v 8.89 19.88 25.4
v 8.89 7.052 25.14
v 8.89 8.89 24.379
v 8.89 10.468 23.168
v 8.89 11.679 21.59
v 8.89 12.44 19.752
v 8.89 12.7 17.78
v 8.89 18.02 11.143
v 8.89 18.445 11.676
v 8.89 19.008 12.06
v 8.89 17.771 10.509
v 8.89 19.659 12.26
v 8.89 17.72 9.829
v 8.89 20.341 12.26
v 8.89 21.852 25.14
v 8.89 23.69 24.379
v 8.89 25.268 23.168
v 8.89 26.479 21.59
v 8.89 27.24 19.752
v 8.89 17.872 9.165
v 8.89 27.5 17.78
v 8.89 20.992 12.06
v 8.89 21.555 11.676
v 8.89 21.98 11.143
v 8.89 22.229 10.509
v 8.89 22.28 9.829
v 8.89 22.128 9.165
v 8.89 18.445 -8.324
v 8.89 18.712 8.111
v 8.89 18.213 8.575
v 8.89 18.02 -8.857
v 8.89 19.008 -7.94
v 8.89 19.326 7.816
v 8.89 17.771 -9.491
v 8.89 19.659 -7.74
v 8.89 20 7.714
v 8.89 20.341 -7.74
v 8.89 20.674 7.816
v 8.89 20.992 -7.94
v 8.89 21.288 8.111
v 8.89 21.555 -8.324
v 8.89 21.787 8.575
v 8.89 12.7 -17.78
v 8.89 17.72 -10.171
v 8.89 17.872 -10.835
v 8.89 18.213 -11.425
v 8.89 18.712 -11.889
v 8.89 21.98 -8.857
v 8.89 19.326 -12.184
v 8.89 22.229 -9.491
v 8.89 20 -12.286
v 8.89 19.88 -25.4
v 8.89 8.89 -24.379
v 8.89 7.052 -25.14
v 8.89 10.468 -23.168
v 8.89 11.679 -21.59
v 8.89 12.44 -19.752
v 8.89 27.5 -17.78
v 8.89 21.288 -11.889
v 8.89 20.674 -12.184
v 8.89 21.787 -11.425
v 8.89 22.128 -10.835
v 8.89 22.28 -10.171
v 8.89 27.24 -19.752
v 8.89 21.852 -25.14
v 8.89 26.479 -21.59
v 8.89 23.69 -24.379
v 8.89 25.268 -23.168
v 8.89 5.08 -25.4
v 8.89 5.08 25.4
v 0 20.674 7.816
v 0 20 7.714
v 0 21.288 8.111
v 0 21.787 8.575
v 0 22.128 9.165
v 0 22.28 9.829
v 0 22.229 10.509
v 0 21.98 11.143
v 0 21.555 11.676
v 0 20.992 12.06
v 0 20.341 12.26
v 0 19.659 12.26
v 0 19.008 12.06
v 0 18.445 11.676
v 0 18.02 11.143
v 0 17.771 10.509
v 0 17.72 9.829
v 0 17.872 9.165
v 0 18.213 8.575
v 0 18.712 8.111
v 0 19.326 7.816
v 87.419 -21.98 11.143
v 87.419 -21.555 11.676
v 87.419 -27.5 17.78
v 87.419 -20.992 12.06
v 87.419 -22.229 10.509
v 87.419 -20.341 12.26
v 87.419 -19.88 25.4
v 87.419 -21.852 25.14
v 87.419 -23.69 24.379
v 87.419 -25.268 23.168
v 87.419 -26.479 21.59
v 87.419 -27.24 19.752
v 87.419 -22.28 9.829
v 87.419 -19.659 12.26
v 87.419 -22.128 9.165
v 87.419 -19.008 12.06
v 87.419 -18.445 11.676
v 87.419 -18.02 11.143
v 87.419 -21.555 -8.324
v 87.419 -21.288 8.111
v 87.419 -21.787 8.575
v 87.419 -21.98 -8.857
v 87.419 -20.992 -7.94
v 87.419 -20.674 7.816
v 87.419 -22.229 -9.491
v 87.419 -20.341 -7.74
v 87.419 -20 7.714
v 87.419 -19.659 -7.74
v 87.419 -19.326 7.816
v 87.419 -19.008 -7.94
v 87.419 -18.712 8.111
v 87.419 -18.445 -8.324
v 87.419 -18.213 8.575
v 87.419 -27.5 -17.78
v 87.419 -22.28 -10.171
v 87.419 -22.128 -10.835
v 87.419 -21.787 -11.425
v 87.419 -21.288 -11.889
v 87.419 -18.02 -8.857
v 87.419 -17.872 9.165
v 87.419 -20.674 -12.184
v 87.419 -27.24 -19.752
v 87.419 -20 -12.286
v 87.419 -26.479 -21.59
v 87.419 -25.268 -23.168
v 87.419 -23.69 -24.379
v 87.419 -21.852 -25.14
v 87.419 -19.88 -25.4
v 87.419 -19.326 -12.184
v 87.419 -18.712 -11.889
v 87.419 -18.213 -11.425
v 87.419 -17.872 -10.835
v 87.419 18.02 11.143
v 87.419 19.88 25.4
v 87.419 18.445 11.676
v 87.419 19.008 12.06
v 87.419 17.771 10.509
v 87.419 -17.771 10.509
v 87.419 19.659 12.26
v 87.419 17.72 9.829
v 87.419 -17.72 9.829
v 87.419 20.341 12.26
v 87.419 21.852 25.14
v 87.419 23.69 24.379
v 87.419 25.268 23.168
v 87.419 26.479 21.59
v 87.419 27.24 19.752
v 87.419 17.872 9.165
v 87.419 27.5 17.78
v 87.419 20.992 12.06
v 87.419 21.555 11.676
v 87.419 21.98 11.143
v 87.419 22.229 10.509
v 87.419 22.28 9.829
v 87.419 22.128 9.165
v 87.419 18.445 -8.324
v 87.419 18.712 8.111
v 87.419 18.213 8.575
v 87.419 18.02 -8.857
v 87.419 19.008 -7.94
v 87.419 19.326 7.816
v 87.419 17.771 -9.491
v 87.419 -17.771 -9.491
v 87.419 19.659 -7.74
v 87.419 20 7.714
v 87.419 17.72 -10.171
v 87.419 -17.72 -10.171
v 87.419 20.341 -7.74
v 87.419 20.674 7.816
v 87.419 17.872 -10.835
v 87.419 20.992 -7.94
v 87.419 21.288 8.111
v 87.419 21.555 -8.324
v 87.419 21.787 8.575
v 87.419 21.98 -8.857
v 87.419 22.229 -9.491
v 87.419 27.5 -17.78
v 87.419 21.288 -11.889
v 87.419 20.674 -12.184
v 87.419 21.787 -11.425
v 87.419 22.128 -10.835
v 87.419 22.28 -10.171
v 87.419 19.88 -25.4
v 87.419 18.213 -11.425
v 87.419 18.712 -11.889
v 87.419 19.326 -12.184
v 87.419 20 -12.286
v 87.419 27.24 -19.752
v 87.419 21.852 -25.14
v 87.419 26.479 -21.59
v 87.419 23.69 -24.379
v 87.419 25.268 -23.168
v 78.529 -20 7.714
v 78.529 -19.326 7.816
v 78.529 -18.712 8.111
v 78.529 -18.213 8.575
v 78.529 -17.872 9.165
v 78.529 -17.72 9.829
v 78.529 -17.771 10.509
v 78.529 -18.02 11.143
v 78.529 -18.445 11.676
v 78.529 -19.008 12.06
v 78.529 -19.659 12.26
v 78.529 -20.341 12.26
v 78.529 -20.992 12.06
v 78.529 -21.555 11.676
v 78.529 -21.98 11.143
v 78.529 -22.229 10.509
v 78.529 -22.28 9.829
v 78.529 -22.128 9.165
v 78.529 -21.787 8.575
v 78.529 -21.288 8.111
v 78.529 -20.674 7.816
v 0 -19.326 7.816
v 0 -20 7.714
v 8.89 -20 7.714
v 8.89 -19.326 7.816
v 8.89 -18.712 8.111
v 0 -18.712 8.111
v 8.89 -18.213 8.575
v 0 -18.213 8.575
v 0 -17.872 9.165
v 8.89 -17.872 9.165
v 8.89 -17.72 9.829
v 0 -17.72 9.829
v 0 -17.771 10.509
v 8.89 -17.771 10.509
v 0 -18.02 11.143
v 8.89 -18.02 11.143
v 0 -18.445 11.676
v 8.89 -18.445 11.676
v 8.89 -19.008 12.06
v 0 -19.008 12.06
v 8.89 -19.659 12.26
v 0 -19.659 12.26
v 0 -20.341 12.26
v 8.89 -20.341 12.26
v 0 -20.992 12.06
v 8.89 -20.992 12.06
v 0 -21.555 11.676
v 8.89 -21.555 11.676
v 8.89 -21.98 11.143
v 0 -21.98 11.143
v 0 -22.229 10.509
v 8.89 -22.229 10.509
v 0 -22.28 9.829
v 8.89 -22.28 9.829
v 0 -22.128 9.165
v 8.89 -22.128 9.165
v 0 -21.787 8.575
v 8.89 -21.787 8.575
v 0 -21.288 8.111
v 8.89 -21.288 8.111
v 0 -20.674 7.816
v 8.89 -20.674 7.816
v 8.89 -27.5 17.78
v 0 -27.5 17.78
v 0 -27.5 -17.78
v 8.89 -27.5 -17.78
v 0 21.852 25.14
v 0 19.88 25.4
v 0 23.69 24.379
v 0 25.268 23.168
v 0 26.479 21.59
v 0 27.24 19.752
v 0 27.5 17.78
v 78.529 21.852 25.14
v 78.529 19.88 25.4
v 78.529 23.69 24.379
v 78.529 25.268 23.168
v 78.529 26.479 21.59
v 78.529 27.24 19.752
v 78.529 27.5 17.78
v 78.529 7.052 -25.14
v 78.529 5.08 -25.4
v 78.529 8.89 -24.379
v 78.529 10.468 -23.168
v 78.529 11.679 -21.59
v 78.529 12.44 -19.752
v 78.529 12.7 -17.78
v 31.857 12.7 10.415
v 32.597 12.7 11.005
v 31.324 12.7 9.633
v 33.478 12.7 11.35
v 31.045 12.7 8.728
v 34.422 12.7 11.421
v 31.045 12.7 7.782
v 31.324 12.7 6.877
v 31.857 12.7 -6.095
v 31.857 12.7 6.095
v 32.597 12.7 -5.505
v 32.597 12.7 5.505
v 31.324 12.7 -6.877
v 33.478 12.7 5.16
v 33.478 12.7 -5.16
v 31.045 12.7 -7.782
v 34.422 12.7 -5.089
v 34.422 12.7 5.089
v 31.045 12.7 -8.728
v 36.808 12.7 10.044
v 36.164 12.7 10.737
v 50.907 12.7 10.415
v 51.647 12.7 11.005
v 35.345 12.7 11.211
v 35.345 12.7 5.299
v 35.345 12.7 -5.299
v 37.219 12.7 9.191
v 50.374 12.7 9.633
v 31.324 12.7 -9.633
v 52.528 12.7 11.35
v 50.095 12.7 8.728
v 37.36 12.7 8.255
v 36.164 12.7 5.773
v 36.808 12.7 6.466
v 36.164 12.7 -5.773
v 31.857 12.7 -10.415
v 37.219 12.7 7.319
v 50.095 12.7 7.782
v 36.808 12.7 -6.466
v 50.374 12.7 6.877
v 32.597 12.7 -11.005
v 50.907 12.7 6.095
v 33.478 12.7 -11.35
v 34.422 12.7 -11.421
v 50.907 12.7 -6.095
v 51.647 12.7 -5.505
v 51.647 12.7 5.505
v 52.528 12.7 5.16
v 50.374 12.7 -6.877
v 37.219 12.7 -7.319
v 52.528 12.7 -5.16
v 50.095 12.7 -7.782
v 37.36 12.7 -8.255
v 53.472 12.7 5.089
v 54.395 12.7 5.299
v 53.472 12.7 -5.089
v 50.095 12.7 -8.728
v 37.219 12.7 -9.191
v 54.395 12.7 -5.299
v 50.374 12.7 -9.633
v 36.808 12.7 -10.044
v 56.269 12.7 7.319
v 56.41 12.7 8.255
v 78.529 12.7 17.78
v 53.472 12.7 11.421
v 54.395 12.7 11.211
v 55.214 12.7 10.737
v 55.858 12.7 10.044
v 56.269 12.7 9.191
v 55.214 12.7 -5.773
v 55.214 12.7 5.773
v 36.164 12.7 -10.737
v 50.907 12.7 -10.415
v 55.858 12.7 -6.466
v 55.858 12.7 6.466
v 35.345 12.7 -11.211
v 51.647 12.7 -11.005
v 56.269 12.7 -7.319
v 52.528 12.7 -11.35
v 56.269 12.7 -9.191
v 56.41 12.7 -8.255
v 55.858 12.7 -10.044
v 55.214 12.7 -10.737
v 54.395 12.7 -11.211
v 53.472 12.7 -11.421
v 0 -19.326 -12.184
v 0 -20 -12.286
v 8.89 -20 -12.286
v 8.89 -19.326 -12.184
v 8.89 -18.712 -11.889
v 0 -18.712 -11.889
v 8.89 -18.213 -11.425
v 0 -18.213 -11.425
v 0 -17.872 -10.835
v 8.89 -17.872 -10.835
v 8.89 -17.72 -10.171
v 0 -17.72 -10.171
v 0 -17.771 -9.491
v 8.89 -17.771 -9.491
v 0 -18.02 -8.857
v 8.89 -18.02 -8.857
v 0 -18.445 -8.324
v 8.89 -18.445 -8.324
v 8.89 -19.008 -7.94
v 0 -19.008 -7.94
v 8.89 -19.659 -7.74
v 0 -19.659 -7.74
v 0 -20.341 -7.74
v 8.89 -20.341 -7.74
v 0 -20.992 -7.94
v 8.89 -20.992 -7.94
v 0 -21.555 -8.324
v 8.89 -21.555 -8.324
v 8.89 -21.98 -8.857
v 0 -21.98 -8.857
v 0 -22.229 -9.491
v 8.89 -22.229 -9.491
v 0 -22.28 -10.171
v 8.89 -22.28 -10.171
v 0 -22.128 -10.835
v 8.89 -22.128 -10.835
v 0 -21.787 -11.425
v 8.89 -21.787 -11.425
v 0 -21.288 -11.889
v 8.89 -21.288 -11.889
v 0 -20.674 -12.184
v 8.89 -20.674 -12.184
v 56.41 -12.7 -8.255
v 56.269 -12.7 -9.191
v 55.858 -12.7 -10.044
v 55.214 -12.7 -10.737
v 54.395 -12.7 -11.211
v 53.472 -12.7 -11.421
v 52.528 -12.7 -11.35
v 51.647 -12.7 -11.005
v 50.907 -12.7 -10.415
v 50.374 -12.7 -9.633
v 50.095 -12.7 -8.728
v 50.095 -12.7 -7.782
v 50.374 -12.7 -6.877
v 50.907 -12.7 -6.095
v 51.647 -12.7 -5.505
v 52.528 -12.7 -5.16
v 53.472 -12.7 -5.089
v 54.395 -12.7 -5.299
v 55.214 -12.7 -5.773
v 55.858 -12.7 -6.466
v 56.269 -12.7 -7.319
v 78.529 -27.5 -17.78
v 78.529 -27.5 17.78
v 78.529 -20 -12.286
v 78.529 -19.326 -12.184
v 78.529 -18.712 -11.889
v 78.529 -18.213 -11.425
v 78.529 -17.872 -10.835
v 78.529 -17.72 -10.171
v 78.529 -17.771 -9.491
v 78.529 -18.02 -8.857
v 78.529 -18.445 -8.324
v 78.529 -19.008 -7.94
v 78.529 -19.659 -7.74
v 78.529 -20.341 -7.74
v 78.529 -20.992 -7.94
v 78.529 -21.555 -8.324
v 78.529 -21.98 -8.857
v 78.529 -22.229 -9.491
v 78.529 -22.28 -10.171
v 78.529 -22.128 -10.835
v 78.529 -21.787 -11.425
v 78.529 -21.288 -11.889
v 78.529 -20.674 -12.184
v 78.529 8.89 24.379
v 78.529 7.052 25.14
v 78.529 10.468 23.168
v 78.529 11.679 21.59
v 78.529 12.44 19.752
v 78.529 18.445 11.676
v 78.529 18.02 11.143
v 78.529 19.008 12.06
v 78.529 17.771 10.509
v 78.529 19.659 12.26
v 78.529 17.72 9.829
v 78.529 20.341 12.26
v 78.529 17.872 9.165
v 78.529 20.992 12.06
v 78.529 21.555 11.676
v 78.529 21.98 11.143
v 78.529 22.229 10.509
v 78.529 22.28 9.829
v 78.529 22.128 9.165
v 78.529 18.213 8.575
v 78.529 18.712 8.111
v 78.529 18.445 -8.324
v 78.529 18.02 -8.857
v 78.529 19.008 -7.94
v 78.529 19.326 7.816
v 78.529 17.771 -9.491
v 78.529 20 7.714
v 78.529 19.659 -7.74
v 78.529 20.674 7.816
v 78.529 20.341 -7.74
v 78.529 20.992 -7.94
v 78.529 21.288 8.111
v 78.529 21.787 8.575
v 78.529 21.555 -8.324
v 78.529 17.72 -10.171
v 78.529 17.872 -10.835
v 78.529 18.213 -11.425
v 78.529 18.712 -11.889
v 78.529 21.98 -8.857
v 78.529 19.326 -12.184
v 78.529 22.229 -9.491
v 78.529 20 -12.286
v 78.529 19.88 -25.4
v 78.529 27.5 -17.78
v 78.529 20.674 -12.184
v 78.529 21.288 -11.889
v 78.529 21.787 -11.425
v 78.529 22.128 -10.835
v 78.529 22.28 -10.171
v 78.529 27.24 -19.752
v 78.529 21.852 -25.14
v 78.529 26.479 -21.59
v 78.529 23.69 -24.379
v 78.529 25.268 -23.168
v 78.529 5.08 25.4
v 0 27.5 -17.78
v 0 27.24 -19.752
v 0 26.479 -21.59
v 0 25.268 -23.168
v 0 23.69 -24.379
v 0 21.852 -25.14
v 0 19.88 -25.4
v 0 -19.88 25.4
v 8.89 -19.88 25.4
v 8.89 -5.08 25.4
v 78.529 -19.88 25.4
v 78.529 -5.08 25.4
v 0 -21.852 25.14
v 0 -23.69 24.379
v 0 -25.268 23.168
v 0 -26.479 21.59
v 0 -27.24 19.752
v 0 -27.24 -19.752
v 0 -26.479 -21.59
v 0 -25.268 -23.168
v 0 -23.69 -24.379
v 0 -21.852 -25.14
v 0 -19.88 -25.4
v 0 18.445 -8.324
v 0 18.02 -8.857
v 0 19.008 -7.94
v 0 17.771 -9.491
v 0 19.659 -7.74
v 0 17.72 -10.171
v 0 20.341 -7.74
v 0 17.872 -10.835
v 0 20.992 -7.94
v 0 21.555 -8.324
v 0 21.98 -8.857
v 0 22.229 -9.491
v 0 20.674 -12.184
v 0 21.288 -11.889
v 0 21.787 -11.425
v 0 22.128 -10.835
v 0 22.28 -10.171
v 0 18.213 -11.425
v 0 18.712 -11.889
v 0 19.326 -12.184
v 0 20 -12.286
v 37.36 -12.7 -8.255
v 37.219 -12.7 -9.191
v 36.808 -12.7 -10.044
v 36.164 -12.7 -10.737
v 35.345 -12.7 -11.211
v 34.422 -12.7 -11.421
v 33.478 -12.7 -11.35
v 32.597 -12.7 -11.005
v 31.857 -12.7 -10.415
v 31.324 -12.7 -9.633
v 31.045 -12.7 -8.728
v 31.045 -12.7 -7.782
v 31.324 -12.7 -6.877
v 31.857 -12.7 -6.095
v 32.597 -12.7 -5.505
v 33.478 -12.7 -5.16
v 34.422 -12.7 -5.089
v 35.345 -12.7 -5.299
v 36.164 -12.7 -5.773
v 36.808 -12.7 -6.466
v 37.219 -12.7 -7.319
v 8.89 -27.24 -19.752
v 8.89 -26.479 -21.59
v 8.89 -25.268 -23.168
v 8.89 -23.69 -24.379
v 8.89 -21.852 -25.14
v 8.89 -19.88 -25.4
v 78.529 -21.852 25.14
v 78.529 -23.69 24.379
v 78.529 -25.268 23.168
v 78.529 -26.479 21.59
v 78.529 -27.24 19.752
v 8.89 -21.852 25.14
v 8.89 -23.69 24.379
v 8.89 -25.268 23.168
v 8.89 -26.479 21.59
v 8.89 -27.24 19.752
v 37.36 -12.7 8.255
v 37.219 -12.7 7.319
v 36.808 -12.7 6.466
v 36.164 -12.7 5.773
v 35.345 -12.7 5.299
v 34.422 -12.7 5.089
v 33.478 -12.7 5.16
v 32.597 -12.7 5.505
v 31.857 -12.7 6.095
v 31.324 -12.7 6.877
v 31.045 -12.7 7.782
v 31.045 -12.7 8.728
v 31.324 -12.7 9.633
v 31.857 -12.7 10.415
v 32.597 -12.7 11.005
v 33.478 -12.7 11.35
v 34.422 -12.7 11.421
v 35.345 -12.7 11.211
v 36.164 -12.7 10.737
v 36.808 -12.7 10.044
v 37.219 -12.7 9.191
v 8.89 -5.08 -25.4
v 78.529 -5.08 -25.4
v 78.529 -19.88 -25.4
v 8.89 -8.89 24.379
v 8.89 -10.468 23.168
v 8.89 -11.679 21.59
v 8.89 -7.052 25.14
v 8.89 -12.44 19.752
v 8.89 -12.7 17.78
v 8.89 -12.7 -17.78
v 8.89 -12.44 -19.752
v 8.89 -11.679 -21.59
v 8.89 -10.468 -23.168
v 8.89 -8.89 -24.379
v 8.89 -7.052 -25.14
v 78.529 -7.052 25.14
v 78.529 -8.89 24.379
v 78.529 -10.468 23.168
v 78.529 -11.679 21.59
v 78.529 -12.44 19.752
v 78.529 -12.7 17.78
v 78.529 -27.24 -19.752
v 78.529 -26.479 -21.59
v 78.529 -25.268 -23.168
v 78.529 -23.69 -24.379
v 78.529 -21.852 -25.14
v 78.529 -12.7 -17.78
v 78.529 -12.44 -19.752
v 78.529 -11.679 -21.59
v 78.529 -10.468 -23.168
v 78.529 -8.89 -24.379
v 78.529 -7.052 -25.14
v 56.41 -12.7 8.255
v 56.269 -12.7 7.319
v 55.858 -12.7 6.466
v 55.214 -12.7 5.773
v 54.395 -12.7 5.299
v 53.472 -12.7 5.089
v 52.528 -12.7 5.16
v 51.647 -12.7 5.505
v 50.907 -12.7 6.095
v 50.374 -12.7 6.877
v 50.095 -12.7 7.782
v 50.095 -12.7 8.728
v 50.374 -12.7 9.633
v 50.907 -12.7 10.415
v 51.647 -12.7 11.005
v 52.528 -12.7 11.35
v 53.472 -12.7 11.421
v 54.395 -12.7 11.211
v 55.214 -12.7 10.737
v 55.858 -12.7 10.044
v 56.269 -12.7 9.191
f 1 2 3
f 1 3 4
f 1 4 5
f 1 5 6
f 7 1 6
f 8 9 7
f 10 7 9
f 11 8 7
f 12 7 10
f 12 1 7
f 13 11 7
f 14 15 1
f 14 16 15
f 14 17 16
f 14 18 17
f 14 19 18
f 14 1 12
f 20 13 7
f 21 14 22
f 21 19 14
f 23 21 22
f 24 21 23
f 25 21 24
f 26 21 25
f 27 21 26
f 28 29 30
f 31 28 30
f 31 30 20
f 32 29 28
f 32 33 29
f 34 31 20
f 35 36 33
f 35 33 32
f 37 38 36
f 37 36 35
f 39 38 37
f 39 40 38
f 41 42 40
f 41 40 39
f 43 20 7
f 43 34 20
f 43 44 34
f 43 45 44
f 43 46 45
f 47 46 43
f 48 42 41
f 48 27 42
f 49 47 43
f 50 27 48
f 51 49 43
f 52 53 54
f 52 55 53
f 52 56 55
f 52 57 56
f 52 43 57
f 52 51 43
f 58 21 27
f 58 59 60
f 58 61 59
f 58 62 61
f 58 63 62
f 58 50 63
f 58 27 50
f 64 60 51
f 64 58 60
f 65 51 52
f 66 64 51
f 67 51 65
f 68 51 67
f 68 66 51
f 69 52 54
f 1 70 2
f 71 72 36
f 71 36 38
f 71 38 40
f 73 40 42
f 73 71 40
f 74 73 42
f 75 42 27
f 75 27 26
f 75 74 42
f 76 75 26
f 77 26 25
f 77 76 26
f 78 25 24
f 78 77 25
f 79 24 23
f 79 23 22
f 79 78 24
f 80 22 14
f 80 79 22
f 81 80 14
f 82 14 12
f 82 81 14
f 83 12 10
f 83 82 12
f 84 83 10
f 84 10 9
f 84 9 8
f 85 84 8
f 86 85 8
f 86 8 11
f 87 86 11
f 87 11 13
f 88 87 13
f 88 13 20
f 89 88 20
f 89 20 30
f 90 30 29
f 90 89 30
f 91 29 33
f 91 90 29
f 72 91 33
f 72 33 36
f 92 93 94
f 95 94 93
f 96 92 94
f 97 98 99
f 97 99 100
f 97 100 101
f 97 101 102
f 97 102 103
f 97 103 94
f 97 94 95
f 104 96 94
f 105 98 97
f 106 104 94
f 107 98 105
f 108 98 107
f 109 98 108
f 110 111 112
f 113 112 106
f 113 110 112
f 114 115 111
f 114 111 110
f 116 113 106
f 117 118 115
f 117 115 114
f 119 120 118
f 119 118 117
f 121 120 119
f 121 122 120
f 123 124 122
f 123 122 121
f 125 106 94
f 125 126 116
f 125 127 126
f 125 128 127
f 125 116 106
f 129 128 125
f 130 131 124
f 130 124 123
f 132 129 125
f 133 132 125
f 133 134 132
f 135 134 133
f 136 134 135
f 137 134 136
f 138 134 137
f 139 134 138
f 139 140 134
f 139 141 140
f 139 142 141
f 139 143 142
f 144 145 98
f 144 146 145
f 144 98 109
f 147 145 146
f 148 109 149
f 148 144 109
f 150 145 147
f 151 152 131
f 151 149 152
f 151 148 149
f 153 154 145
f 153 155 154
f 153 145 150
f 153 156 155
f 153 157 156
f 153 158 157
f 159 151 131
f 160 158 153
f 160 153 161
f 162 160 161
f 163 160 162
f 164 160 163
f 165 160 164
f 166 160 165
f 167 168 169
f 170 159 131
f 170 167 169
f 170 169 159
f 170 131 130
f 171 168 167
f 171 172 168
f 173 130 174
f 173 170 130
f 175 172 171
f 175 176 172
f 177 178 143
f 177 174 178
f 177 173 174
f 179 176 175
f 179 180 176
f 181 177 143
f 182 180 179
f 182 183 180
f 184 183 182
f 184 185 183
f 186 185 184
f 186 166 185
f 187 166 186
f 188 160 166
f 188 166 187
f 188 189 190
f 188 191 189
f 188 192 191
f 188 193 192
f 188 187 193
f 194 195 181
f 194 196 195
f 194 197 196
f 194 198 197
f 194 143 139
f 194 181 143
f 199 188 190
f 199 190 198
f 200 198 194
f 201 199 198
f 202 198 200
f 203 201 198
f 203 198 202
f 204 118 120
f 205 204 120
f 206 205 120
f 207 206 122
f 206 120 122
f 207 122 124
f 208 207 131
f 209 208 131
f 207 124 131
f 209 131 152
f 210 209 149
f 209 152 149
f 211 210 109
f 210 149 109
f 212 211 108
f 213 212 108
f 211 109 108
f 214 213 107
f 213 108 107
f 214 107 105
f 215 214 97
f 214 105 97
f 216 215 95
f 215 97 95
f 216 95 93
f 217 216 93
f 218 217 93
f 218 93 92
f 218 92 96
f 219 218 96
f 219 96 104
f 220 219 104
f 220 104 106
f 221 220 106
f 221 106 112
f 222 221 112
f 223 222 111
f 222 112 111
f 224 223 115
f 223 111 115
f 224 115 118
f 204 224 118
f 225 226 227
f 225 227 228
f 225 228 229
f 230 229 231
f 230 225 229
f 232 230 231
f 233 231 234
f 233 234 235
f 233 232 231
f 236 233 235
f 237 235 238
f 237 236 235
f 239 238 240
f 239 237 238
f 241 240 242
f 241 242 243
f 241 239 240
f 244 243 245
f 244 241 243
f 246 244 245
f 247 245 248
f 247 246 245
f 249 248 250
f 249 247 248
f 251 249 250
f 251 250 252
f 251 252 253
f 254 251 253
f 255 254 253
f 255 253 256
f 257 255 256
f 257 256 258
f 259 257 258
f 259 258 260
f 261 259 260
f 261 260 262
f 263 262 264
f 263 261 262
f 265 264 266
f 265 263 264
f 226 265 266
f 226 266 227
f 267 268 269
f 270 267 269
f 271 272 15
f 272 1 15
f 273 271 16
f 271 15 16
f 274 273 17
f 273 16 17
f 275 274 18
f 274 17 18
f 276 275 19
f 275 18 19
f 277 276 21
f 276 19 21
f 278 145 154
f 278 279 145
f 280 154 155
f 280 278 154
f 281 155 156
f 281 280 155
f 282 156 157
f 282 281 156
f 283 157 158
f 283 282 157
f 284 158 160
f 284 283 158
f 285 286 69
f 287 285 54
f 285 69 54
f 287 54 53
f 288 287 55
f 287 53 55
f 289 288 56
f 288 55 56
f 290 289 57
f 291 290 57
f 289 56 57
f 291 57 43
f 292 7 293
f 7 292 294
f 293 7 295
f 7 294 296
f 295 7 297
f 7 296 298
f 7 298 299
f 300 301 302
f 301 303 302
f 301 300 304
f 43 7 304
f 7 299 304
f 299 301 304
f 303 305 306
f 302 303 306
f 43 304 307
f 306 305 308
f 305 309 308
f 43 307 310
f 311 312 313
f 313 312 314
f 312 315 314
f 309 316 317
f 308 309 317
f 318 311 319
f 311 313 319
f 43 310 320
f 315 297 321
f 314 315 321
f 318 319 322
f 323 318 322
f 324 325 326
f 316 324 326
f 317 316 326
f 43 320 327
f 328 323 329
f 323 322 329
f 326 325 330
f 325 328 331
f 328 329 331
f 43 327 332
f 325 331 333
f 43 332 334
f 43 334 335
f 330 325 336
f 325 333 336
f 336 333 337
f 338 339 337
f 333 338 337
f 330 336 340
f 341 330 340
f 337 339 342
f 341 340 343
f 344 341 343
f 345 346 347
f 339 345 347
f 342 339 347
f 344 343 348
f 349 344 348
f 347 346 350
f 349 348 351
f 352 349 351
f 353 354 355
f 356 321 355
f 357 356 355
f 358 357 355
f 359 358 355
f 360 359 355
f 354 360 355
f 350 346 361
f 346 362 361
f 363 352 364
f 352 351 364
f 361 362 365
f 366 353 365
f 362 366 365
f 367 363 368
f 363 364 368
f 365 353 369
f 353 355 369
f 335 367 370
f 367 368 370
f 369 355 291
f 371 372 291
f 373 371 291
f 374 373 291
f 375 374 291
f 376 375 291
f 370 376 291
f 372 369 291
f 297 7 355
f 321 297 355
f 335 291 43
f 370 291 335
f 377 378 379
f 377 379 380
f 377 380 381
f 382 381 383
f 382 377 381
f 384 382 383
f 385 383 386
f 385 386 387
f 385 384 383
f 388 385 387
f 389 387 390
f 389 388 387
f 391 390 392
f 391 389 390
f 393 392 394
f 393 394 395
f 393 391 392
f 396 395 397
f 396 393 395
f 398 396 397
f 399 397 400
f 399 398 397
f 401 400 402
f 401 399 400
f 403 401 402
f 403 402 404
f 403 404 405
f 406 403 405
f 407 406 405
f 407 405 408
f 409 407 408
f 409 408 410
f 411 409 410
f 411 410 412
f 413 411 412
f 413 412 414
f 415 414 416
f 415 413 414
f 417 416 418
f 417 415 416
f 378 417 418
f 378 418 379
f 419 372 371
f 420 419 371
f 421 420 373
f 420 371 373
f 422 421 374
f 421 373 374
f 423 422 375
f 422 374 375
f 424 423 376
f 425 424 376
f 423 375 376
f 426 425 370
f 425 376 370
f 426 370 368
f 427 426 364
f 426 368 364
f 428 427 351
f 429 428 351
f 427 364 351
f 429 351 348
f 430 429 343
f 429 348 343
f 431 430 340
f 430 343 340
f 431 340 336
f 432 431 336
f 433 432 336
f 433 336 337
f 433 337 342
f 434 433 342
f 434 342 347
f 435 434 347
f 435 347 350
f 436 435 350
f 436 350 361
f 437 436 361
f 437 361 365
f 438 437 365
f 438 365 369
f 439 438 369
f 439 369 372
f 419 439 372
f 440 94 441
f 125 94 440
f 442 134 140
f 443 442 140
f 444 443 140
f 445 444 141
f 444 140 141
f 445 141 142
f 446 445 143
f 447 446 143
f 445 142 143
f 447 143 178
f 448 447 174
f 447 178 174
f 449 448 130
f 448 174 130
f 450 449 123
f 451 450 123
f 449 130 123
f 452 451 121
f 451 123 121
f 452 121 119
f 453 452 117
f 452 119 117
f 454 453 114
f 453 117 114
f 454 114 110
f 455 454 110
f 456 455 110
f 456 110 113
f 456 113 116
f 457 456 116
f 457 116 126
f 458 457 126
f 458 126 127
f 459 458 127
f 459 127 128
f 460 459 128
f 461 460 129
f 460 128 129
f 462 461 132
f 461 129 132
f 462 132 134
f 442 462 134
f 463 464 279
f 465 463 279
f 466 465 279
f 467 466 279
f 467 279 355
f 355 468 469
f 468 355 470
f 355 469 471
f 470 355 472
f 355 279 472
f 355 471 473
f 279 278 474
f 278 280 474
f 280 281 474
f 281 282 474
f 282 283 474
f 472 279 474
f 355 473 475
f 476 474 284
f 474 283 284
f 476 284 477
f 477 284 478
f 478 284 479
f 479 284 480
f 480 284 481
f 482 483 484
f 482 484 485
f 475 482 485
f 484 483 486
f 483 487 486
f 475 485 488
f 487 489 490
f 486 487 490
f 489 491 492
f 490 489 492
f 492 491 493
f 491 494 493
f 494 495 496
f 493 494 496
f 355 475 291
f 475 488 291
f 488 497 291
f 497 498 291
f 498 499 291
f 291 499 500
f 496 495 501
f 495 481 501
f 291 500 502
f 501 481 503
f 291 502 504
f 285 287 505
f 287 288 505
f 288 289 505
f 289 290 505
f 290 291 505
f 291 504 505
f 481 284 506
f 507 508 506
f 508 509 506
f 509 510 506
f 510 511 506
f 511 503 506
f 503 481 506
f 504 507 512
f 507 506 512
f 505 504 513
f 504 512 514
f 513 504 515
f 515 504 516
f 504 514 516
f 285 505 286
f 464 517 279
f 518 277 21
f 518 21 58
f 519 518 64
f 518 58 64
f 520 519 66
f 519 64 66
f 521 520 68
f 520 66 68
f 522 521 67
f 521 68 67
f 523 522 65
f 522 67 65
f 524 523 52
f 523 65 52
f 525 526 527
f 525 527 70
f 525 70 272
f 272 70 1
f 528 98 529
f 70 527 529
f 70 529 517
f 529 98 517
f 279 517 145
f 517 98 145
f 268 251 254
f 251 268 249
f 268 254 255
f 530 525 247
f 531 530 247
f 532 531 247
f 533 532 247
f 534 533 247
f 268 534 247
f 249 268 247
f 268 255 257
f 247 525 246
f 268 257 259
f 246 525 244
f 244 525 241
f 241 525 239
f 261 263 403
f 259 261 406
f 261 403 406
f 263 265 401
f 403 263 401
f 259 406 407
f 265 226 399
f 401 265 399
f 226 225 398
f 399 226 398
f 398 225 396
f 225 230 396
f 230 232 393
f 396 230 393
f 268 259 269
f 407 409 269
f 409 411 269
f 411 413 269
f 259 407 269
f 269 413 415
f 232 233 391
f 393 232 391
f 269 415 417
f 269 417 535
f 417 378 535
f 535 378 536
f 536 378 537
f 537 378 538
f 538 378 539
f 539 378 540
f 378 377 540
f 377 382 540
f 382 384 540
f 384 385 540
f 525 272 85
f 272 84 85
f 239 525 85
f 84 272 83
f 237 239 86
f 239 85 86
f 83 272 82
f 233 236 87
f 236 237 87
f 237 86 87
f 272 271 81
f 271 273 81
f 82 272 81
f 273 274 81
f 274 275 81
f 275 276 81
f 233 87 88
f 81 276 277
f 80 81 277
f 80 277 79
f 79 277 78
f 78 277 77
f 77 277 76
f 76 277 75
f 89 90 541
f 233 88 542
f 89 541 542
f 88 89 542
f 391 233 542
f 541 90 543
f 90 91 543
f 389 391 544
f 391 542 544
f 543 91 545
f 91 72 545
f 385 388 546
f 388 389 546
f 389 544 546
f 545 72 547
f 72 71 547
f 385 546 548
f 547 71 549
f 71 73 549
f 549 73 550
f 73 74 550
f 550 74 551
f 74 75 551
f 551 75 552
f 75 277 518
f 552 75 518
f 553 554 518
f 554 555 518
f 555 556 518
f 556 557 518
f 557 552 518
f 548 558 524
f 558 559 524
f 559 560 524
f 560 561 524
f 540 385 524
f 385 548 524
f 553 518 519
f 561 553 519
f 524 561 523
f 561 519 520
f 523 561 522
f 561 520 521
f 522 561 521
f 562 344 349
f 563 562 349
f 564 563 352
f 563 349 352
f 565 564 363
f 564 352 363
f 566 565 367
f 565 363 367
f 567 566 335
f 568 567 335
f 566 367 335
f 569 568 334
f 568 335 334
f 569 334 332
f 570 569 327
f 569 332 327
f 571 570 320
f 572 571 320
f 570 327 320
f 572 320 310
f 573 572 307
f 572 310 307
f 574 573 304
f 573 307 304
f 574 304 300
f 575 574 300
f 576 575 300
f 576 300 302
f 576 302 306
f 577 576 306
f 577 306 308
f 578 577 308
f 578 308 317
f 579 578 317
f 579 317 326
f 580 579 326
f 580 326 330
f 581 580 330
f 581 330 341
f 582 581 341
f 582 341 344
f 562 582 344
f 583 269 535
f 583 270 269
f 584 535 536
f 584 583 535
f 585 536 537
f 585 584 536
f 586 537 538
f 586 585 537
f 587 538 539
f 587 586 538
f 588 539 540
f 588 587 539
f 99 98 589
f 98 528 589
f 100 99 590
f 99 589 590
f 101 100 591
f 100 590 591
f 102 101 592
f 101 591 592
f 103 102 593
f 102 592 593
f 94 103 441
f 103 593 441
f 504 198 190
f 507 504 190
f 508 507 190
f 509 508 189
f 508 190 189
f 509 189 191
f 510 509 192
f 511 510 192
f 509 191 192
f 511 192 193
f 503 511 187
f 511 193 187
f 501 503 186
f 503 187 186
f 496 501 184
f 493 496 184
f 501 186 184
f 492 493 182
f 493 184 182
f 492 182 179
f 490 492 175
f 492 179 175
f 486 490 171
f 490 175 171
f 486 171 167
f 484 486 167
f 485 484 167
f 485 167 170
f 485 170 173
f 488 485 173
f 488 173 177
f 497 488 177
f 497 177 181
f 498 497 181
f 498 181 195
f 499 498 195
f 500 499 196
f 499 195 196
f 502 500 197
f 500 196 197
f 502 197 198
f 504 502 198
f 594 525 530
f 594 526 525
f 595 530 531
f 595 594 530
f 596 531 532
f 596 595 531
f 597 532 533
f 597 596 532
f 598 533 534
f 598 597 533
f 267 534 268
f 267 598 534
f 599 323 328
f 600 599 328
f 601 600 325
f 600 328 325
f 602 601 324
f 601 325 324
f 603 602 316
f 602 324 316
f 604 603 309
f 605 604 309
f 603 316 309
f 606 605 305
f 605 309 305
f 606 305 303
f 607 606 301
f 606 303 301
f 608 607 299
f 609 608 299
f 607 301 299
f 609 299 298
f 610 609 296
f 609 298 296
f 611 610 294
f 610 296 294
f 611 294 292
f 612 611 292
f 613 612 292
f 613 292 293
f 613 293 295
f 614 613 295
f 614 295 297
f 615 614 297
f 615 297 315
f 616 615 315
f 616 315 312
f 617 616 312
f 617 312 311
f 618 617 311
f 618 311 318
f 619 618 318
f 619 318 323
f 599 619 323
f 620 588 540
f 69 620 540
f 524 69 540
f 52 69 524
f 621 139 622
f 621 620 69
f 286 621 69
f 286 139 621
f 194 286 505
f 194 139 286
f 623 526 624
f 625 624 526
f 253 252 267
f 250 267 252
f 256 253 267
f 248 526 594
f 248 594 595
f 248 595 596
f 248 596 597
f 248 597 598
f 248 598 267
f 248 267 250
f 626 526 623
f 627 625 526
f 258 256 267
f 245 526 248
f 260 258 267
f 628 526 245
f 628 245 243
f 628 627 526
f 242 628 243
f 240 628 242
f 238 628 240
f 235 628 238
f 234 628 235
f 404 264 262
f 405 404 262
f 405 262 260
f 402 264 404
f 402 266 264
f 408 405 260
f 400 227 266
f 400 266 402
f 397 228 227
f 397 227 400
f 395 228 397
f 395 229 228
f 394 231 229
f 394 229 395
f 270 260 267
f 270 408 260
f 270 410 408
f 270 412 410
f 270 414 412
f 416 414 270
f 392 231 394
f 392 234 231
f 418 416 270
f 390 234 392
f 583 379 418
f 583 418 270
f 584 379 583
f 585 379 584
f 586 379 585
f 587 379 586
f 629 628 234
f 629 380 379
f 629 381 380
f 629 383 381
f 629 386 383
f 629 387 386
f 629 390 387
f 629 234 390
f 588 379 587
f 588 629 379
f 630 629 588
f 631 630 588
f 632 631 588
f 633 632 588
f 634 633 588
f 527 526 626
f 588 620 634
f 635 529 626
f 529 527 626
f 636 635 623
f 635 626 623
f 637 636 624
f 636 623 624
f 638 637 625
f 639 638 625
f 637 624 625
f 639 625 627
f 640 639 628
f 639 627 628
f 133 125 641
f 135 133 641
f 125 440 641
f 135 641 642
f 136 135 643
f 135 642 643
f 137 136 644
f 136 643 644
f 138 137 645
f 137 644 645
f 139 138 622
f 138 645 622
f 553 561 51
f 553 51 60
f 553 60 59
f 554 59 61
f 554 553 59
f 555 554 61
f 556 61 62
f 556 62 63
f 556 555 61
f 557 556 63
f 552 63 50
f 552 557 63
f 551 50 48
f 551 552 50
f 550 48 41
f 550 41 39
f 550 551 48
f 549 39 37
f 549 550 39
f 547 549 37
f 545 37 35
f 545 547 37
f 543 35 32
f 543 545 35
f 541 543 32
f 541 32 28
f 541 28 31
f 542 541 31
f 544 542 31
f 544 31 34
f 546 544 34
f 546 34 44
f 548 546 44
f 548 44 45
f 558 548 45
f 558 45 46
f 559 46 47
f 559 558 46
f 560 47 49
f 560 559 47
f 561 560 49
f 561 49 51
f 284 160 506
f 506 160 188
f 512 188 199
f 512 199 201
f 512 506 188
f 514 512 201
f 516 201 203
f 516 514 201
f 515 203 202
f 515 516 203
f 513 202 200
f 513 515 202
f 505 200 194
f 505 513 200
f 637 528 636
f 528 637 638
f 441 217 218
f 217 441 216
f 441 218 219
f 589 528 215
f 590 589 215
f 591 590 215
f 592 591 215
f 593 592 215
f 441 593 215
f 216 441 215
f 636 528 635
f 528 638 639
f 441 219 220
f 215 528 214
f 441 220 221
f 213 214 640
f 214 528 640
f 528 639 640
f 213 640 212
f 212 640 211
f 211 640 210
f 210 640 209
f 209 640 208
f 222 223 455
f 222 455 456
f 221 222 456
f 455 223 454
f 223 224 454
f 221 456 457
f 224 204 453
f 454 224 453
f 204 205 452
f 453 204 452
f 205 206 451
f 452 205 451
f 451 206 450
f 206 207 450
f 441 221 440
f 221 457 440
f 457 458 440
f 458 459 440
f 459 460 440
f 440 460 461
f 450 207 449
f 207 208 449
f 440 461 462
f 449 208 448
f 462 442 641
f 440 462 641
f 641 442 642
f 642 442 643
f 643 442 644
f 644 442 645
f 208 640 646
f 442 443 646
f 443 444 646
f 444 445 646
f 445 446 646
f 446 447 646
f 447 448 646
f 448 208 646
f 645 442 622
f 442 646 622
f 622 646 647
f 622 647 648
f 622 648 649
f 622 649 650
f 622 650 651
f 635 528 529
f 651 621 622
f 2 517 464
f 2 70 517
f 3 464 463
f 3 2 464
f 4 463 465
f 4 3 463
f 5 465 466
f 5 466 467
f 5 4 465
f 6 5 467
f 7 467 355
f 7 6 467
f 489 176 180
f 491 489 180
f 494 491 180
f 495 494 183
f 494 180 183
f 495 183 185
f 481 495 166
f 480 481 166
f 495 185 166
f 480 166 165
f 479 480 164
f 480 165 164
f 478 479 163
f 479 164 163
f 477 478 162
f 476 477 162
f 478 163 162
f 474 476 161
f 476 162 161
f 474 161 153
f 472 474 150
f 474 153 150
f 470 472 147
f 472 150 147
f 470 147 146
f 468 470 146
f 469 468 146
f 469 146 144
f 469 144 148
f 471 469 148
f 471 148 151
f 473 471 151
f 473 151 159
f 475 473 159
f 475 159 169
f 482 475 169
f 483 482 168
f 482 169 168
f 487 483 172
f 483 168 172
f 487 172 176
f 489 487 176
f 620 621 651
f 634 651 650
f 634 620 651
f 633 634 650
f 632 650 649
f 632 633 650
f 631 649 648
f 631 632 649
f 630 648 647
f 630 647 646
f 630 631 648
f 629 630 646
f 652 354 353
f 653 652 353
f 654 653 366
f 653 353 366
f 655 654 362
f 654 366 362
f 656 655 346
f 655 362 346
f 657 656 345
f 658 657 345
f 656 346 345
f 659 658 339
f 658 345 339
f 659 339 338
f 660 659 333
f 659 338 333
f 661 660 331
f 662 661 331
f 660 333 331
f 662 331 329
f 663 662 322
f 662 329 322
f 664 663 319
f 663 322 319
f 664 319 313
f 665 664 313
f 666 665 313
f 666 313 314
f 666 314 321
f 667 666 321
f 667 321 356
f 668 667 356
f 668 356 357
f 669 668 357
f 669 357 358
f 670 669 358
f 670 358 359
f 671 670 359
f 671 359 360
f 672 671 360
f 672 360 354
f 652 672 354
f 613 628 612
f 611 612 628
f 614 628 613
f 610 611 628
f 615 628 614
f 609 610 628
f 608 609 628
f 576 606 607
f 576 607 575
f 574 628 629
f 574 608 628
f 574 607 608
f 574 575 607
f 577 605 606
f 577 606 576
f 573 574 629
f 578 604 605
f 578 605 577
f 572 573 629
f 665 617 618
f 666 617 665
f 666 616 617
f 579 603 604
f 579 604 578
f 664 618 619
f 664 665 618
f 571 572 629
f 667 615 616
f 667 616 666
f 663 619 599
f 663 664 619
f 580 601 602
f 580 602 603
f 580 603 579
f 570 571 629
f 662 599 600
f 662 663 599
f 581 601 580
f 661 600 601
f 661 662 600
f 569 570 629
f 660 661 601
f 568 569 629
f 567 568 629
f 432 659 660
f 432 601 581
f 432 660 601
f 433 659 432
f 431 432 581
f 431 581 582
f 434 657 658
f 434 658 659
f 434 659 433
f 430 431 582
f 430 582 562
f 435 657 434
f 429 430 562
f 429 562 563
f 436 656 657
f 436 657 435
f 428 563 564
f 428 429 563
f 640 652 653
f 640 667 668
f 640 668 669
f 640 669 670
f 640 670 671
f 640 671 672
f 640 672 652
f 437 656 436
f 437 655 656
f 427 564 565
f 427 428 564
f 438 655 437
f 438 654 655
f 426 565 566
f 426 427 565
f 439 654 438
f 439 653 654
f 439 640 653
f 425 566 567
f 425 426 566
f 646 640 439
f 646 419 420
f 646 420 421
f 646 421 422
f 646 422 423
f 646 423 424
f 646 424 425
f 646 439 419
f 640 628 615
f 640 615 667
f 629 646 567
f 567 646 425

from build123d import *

# Parameters (mm, degrees)
SKETCH1_W           = 50.8
SKETCH1_H           = 55
SKETCH1_R           = 2.286
BOSS_EXTRUDE1_DEPTH = 8.89
FILLET1_R           = 7.62
SKETCH2_W           = 50.8
SKETCH2_H           = 25.4
BOSS_EXTRUDE2_DEPTH = 34.81959
FILLET2_R           = 7.62
SKETCH3_R           = 3.175
CUT_EXTRUDE1_DEPTH  = 41.2
LPATTERN1_COUNT     = 2
LPATTERN1_PITCH     = 16.51


with BuildPart() as part:
    # Sketch1 → Boss-Extrude1 (new body)
    with BuildSketch(Plane(origin=(0, 0, 0), x_dir=(0, 0, -1), z_dir=(1, 0, 0))):
        Rectangle(SKETCH1_W, SKETCH1_H)
        with Locations((-10, 20)):
            Circle(SKETCH1_R, mode=Mode.SUBTRACT)
        with Locations((10, 20)):
            Circle(SKETCH1_R, mode=Mode.SUBTRACT)
        with Locations((-10, -20)):
            Circle(SKETCH1_R, mode=Mode.SUBTRACT)
        with Locations((10, -20)):
            Circle(SKETCH1_R, mode=Mode.SUBTRACT)
    extrude(amount=BOSS_EXTRUDE1_DEPTH)

    # Fillet1
    fillet1_edges = [part.edges().sort_by_distance(p)[0] for p in [
        (4.445, 27.5, 25.4),
        (4.445, 27.5, -25.4),
        (4.445, -27.5, -25.4),
        (4.445, -27.5, 25.4),
    ]]
    fillet(fillet1_edges, radius=FILLET1_R)

    # Sketch2 → Boss-Extrude2 (add)
    with BuildSketch(Plane(origin=(8.89, 0, 0), x_dir=(0, 0, -1), z_dir=(1, 0, 0))):
        Rectangle(SKETCH2_W, SKETCH2_H)
    extrude(amount=BOSS_EXTRUDE2_DEPTH)

    # Fillet2
    fillet2_edges = [part.edges().sort_by_distance(p)[0] for p in [
        (26.299795, 12.7, 25.4),
        (26.299795, -12.7, 25.4),
        (26.299795, -12.7, -25.4),
        (26.299795, 12.7, -25.4),
    ]]
    fillet(fillet2_edges, radius=FILLET2_R)

    # Mirror6: part across plane


with BuildPart() as part_1:
    add(part.part)
    add(part.part.mirror(Plane(origin=(43.70959, 0, 0), x_dir=(0, 0, 1), z_dir=(1, 0, 0))))

    # Sketch3 → Cut-Extrude1 (cut, through all)
    with BuildSketch(Plane(origin=(0, 12.7, 0), x_dir=(1, 0, 0), z_dir=(0, 1, 0))):
        with Locations((53.23459, 8.255)):
            Circle(SKETCH3_R)
        with Locations((34.18459, 8.255)):
            Circle(SKETCH3_R)
    cut_extrude1 = extrude(amount=-CUT_EXTRUDE1_DEPTH, mode=Mode.SUBTRACT)

    # LPattern1: Cut-Extrude1 ×2
    with Locations(*[(0, 0, i * LPATTERN1_PITCH) for i in range(1, LPATTERN1_COUNT)]):
        add(cut_extrude1, mode=Mode.SUBTRACT)


solid = part_1.part
